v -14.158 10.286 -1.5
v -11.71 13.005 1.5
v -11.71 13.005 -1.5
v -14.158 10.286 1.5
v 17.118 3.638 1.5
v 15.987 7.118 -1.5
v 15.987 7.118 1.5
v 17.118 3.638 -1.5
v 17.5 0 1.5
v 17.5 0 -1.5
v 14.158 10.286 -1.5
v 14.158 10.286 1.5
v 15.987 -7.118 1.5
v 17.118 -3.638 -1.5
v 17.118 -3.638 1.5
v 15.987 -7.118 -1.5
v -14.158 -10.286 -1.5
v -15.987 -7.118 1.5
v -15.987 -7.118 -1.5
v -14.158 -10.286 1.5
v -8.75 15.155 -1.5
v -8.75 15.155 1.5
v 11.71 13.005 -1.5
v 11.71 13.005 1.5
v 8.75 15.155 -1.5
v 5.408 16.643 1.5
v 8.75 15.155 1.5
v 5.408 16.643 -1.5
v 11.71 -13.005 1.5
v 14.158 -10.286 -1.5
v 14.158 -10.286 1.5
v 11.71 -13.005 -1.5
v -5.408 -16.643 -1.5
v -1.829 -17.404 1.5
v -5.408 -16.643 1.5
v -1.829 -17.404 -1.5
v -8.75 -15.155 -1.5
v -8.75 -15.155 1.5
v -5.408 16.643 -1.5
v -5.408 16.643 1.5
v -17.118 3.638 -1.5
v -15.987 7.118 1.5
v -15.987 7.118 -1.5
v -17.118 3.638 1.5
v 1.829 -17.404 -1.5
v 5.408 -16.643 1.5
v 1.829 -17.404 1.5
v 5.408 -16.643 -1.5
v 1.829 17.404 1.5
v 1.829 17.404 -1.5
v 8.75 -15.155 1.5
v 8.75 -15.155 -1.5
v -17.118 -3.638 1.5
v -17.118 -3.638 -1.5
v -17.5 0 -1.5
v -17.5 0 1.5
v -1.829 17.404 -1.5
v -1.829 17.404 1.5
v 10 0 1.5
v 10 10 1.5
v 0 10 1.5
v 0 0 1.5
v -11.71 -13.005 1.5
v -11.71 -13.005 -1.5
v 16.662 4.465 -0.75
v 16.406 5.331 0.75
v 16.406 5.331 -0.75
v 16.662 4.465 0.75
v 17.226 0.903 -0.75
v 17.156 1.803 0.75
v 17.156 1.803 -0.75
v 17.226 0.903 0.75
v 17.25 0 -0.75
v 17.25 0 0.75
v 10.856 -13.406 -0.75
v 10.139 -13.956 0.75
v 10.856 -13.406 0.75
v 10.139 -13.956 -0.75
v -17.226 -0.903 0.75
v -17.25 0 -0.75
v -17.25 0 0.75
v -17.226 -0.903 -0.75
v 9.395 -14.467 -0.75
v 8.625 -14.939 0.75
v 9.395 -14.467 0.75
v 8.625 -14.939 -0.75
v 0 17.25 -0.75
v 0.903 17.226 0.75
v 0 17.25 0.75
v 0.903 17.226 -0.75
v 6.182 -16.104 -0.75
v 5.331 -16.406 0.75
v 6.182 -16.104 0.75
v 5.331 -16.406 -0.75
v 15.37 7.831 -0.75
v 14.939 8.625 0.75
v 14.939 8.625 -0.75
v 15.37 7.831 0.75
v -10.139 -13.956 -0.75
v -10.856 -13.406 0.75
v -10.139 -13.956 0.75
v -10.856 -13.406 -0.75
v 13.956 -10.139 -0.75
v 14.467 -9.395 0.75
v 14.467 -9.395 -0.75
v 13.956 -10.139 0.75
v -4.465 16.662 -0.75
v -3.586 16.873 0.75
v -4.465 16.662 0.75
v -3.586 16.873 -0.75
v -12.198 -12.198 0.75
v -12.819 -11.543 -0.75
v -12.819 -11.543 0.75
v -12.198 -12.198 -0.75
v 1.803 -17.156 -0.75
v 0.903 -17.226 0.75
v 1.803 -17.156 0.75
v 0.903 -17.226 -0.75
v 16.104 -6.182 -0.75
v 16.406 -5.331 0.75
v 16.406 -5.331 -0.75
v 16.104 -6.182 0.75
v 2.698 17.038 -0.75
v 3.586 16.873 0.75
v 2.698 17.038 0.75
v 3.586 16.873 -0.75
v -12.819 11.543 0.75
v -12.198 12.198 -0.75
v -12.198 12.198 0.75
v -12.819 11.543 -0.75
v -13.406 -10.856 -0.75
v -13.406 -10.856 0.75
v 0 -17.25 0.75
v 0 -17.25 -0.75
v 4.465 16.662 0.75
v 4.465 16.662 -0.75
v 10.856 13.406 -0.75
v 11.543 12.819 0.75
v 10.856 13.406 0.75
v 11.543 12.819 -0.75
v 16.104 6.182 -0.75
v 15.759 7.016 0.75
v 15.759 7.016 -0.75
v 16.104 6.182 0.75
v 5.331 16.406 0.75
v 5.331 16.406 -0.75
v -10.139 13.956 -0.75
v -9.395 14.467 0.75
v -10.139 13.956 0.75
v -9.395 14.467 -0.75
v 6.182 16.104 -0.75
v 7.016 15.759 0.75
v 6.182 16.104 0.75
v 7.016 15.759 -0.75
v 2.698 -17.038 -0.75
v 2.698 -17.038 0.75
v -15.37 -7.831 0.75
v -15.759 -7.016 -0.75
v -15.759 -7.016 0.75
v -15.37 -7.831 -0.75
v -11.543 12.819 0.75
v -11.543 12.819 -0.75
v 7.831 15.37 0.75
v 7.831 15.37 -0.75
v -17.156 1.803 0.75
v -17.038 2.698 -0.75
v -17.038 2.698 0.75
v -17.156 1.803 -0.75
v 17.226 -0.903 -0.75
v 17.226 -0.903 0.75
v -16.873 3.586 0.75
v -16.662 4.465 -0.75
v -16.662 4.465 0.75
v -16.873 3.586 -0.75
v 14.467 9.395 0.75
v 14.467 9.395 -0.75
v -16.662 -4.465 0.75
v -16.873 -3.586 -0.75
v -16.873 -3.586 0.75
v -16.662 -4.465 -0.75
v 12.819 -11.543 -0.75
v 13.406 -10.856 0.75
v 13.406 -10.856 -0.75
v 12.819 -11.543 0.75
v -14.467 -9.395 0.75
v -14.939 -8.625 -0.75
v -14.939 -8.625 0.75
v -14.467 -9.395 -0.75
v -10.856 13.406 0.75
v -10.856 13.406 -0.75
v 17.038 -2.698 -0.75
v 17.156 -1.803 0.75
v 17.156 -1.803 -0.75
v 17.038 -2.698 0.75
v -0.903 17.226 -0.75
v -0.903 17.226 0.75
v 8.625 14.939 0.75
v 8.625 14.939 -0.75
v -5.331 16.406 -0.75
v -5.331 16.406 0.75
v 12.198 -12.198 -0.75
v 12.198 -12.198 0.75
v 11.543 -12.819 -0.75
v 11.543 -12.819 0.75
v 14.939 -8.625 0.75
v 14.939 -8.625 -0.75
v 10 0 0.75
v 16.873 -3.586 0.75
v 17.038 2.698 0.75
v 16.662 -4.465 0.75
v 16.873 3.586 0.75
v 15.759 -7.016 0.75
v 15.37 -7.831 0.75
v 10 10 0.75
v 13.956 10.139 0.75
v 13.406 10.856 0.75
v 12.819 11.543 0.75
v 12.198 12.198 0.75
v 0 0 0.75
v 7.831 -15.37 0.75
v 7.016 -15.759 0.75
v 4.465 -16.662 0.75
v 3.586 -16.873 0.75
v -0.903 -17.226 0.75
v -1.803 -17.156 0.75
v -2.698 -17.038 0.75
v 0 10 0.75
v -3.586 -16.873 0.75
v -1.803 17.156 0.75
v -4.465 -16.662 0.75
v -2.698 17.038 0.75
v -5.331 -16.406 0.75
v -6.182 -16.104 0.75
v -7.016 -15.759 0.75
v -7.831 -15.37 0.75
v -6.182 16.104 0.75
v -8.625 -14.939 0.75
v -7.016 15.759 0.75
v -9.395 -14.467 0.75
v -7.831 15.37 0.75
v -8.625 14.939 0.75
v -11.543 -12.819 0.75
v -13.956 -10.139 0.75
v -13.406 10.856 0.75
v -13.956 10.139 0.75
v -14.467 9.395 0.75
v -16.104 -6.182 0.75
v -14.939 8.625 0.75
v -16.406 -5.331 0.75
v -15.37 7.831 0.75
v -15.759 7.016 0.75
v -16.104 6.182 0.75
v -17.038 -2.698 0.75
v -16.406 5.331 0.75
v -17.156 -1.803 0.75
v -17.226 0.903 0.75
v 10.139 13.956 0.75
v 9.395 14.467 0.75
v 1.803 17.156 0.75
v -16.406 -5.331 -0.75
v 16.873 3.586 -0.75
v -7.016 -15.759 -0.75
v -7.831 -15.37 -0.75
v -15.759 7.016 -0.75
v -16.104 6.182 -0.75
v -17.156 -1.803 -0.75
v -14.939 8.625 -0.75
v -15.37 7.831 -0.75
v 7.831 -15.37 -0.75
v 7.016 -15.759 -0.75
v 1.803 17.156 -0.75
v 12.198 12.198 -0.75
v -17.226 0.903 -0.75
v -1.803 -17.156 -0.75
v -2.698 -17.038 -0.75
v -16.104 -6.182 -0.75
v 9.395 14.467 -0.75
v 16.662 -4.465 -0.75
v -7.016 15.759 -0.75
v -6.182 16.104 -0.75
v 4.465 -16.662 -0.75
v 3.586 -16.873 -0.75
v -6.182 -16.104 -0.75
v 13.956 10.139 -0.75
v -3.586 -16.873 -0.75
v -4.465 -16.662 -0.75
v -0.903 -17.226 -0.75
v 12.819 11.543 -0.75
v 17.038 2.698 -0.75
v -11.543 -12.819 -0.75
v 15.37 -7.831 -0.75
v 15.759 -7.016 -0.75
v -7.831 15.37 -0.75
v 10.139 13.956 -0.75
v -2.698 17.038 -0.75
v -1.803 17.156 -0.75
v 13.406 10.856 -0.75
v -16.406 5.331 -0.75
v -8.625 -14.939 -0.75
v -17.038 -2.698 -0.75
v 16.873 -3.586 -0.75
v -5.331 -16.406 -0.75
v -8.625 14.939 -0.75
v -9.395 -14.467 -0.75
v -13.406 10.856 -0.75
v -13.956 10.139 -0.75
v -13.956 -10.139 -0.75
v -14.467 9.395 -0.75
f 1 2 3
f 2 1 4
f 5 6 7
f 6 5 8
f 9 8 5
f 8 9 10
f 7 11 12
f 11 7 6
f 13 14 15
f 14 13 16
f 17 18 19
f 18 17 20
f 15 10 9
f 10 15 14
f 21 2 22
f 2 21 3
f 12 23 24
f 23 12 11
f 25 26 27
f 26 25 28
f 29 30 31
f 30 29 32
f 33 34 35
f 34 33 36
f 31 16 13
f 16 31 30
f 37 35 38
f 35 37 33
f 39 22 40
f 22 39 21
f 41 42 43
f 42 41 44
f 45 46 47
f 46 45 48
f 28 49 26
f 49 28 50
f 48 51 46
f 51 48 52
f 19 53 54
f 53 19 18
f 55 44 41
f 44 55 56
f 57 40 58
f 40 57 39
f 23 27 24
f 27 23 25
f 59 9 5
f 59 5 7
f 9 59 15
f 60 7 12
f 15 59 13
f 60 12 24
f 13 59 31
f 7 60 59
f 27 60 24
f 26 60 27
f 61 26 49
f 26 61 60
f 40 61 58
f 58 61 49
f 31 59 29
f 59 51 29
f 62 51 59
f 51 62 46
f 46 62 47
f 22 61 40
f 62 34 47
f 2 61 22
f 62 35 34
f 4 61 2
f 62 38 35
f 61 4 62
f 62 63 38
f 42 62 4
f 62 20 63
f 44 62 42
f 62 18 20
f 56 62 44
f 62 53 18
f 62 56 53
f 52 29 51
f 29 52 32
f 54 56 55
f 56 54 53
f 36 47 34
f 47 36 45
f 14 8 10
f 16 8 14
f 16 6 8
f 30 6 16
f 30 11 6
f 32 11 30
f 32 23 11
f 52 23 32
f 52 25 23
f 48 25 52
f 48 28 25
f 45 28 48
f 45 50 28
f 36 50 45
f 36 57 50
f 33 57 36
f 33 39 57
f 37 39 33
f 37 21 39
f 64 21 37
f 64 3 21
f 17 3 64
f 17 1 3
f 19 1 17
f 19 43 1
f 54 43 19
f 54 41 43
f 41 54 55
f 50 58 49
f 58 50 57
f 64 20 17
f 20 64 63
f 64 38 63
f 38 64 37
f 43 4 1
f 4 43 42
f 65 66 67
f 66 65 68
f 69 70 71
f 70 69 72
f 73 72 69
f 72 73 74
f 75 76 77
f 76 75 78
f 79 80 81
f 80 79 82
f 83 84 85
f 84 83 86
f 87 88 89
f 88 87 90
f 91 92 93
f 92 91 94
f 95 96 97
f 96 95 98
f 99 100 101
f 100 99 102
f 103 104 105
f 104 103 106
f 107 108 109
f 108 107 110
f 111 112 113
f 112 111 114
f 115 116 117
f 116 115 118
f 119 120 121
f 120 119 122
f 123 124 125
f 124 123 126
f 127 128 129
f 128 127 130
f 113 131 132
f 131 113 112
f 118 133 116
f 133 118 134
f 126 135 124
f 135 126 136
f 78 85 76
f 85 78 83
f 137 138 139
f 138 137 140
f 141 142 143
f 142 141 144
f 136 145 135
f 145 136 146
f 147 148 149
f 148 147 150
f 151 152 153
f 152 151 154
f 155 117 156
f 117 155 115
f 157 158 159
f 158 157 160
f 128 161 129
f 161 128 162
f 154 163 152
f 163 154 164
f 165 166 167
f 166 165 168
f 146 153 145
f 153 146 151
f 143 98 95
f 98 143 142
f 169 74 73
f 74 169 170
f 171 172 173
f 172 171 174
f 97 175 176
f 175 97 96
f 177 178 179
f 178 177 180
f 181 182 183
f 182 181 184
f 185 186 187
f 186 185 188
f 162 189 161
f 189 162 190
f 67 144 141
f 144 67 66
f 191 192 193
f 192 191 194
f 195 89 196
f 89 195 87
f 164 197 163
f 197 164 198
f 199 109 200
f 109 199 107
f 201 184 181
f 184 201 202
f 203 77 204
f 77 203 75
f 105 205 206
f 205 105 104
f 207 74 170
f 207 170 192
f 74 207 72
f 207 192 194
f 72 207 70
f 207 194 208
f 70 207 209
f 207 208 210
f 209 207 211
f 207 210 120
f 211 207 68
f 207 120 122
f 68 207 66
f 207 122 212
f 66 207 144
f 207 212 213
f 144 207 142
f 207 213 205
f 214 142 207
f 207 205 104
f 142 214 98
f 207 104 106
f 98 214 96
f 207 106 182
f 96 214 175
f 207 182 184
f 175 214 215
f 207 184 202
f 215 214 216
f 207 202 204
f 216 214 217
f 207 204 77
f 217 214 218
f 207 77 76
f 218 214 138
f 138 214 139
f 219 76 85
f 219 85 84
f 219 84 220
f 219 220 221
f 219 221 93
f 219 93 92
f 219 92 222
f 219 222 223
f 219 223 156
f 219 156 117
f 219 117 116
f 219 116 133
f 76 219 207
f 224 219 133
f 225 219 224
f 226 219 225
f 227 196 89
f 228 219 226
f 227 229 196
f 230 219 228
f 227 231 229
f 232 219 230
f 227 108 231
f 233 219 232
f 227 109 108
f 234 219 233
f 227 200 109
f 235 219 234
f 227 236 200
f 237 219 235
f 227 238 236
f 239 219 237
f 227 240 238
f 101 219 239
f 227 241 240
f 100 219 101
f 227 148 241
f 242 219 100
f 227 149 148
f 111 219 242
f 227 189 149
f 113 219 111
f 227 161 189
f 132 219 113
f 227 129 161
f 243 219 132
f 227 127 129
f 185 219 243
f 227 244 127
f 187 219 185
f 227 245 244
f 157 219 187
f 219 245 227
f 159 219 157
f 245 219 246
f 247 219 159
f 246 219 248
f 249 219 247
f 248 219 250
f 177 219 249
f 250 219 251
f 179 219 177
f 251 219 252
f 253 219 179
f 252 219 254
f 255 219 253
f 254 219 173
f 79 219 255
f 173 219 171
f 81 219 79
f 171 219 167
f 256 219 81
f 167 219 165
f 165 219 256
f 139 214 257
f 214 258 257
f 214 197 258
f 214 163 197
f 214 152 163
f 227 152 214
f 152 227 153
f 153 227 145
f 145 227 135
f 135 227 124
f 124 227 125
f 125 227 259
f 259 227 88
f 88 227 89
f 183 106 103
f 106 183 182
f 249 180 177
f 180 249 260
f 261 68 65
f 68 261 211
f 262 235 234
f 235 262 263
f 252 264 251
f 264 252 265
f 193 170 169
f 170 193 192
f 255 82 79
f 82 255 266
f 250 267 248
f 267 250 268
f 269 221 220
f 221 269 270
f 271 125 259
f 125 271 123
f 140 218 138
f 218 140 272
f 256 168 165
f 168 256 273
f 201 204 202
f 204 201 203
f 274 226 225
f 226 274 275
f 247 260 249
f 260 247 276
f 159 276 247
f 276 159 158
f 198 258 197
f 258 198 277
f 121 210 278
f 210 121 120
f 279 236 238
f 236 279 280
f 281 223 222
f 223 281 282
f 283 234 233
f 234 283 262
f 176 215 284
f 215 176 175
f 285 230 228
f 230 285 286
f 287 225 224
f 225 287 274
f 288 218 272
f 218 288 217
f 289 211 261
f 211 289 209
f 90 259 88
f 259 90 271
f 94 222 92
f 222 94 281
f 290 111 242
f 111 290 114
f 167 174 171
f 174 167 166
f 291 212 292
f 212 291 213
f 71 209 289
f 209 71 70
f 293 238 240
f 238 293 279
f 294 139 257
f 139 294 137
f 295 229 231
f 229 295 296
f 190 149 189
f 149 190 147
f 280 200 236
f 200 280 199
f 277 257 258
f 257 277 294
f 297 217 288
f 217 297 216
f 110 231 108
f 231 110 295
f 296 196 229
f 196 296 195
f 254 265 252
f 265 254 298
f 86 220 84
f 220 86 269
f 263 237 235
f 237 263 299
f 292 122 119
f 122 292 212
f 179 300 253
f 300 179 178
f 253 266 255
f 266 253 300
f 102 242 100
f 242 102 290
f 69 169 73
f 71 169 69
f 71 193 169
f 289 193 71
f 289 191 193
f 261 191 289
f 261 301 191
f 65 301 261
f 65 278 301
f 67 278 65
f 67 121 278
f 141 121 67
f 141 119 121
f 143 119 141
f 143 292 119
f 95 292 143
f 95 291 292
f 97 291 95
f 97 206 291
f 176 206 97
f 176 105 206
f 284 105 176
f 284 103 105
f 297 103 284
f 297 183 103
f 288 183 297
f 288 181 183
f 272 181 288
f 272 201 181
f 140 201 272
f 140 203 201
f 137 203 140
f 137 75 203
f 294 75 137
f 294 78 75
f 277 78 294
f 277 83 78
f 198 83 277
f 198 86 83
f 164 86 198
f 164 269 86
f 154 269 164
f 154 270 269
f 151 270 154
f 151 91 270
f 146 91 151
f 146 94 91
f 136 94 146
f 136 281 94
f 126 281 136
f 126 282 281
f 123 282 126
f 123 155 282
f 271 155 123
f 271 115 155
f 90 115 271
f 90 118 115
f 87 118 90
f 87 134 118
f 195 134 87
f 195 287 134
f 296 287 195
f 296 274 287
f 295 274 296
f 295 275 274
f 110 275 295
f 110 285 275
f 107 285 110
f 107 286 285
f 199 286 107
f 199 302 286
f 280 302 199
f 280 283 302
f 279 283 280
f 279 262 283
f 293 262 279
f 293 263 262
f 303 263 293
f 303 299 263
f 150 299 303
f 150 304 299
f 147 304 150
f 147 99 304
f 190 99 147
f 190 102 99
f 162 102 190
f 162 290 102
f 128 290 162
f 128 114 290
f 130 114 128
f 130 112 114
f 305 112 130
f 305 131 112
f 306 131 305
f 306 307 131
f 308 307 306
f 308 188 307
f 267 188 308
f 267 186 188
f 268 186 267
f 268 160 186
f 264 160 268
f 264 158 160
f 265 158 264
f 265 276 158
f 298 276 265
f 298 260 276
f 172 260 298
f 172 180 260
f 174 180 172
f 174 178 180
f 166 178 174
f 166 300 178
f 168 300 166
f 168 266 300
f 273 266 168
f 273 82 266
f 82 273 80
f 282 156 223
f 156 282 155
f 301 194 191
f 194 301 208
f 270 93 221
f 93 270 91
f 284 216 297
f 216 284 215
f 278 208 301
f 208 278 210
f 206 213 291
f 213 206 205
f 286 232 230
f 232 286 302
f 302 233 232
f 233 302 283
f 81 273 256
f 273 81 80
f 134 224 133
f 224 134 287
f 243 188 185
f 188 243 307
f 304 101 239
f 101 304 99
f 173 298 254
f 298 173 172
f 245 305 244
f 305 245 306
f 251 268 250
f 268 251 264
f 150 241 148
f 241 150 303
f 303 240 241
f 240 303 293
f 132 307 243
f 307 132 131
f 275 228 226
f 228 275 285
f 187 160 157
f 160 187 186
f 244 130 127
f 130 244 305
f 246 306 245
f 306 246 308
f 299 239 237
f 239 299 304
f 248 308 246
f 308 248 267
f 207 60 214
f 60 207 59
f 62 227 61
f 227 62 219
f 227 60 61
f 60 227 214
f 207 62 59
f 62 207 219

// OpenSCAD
size = 34;
height = 1;
space = 0.5;
thickness = 1;


module coin () {
    cylinder(h=height+space,d=size+space, $fn=120, center=true);
}

module case () {
    cylinder(height + thickness * 2, d=size + thickness,center=true);
}

difference (){
case();
coin();
cube([10,10,5]);
}
